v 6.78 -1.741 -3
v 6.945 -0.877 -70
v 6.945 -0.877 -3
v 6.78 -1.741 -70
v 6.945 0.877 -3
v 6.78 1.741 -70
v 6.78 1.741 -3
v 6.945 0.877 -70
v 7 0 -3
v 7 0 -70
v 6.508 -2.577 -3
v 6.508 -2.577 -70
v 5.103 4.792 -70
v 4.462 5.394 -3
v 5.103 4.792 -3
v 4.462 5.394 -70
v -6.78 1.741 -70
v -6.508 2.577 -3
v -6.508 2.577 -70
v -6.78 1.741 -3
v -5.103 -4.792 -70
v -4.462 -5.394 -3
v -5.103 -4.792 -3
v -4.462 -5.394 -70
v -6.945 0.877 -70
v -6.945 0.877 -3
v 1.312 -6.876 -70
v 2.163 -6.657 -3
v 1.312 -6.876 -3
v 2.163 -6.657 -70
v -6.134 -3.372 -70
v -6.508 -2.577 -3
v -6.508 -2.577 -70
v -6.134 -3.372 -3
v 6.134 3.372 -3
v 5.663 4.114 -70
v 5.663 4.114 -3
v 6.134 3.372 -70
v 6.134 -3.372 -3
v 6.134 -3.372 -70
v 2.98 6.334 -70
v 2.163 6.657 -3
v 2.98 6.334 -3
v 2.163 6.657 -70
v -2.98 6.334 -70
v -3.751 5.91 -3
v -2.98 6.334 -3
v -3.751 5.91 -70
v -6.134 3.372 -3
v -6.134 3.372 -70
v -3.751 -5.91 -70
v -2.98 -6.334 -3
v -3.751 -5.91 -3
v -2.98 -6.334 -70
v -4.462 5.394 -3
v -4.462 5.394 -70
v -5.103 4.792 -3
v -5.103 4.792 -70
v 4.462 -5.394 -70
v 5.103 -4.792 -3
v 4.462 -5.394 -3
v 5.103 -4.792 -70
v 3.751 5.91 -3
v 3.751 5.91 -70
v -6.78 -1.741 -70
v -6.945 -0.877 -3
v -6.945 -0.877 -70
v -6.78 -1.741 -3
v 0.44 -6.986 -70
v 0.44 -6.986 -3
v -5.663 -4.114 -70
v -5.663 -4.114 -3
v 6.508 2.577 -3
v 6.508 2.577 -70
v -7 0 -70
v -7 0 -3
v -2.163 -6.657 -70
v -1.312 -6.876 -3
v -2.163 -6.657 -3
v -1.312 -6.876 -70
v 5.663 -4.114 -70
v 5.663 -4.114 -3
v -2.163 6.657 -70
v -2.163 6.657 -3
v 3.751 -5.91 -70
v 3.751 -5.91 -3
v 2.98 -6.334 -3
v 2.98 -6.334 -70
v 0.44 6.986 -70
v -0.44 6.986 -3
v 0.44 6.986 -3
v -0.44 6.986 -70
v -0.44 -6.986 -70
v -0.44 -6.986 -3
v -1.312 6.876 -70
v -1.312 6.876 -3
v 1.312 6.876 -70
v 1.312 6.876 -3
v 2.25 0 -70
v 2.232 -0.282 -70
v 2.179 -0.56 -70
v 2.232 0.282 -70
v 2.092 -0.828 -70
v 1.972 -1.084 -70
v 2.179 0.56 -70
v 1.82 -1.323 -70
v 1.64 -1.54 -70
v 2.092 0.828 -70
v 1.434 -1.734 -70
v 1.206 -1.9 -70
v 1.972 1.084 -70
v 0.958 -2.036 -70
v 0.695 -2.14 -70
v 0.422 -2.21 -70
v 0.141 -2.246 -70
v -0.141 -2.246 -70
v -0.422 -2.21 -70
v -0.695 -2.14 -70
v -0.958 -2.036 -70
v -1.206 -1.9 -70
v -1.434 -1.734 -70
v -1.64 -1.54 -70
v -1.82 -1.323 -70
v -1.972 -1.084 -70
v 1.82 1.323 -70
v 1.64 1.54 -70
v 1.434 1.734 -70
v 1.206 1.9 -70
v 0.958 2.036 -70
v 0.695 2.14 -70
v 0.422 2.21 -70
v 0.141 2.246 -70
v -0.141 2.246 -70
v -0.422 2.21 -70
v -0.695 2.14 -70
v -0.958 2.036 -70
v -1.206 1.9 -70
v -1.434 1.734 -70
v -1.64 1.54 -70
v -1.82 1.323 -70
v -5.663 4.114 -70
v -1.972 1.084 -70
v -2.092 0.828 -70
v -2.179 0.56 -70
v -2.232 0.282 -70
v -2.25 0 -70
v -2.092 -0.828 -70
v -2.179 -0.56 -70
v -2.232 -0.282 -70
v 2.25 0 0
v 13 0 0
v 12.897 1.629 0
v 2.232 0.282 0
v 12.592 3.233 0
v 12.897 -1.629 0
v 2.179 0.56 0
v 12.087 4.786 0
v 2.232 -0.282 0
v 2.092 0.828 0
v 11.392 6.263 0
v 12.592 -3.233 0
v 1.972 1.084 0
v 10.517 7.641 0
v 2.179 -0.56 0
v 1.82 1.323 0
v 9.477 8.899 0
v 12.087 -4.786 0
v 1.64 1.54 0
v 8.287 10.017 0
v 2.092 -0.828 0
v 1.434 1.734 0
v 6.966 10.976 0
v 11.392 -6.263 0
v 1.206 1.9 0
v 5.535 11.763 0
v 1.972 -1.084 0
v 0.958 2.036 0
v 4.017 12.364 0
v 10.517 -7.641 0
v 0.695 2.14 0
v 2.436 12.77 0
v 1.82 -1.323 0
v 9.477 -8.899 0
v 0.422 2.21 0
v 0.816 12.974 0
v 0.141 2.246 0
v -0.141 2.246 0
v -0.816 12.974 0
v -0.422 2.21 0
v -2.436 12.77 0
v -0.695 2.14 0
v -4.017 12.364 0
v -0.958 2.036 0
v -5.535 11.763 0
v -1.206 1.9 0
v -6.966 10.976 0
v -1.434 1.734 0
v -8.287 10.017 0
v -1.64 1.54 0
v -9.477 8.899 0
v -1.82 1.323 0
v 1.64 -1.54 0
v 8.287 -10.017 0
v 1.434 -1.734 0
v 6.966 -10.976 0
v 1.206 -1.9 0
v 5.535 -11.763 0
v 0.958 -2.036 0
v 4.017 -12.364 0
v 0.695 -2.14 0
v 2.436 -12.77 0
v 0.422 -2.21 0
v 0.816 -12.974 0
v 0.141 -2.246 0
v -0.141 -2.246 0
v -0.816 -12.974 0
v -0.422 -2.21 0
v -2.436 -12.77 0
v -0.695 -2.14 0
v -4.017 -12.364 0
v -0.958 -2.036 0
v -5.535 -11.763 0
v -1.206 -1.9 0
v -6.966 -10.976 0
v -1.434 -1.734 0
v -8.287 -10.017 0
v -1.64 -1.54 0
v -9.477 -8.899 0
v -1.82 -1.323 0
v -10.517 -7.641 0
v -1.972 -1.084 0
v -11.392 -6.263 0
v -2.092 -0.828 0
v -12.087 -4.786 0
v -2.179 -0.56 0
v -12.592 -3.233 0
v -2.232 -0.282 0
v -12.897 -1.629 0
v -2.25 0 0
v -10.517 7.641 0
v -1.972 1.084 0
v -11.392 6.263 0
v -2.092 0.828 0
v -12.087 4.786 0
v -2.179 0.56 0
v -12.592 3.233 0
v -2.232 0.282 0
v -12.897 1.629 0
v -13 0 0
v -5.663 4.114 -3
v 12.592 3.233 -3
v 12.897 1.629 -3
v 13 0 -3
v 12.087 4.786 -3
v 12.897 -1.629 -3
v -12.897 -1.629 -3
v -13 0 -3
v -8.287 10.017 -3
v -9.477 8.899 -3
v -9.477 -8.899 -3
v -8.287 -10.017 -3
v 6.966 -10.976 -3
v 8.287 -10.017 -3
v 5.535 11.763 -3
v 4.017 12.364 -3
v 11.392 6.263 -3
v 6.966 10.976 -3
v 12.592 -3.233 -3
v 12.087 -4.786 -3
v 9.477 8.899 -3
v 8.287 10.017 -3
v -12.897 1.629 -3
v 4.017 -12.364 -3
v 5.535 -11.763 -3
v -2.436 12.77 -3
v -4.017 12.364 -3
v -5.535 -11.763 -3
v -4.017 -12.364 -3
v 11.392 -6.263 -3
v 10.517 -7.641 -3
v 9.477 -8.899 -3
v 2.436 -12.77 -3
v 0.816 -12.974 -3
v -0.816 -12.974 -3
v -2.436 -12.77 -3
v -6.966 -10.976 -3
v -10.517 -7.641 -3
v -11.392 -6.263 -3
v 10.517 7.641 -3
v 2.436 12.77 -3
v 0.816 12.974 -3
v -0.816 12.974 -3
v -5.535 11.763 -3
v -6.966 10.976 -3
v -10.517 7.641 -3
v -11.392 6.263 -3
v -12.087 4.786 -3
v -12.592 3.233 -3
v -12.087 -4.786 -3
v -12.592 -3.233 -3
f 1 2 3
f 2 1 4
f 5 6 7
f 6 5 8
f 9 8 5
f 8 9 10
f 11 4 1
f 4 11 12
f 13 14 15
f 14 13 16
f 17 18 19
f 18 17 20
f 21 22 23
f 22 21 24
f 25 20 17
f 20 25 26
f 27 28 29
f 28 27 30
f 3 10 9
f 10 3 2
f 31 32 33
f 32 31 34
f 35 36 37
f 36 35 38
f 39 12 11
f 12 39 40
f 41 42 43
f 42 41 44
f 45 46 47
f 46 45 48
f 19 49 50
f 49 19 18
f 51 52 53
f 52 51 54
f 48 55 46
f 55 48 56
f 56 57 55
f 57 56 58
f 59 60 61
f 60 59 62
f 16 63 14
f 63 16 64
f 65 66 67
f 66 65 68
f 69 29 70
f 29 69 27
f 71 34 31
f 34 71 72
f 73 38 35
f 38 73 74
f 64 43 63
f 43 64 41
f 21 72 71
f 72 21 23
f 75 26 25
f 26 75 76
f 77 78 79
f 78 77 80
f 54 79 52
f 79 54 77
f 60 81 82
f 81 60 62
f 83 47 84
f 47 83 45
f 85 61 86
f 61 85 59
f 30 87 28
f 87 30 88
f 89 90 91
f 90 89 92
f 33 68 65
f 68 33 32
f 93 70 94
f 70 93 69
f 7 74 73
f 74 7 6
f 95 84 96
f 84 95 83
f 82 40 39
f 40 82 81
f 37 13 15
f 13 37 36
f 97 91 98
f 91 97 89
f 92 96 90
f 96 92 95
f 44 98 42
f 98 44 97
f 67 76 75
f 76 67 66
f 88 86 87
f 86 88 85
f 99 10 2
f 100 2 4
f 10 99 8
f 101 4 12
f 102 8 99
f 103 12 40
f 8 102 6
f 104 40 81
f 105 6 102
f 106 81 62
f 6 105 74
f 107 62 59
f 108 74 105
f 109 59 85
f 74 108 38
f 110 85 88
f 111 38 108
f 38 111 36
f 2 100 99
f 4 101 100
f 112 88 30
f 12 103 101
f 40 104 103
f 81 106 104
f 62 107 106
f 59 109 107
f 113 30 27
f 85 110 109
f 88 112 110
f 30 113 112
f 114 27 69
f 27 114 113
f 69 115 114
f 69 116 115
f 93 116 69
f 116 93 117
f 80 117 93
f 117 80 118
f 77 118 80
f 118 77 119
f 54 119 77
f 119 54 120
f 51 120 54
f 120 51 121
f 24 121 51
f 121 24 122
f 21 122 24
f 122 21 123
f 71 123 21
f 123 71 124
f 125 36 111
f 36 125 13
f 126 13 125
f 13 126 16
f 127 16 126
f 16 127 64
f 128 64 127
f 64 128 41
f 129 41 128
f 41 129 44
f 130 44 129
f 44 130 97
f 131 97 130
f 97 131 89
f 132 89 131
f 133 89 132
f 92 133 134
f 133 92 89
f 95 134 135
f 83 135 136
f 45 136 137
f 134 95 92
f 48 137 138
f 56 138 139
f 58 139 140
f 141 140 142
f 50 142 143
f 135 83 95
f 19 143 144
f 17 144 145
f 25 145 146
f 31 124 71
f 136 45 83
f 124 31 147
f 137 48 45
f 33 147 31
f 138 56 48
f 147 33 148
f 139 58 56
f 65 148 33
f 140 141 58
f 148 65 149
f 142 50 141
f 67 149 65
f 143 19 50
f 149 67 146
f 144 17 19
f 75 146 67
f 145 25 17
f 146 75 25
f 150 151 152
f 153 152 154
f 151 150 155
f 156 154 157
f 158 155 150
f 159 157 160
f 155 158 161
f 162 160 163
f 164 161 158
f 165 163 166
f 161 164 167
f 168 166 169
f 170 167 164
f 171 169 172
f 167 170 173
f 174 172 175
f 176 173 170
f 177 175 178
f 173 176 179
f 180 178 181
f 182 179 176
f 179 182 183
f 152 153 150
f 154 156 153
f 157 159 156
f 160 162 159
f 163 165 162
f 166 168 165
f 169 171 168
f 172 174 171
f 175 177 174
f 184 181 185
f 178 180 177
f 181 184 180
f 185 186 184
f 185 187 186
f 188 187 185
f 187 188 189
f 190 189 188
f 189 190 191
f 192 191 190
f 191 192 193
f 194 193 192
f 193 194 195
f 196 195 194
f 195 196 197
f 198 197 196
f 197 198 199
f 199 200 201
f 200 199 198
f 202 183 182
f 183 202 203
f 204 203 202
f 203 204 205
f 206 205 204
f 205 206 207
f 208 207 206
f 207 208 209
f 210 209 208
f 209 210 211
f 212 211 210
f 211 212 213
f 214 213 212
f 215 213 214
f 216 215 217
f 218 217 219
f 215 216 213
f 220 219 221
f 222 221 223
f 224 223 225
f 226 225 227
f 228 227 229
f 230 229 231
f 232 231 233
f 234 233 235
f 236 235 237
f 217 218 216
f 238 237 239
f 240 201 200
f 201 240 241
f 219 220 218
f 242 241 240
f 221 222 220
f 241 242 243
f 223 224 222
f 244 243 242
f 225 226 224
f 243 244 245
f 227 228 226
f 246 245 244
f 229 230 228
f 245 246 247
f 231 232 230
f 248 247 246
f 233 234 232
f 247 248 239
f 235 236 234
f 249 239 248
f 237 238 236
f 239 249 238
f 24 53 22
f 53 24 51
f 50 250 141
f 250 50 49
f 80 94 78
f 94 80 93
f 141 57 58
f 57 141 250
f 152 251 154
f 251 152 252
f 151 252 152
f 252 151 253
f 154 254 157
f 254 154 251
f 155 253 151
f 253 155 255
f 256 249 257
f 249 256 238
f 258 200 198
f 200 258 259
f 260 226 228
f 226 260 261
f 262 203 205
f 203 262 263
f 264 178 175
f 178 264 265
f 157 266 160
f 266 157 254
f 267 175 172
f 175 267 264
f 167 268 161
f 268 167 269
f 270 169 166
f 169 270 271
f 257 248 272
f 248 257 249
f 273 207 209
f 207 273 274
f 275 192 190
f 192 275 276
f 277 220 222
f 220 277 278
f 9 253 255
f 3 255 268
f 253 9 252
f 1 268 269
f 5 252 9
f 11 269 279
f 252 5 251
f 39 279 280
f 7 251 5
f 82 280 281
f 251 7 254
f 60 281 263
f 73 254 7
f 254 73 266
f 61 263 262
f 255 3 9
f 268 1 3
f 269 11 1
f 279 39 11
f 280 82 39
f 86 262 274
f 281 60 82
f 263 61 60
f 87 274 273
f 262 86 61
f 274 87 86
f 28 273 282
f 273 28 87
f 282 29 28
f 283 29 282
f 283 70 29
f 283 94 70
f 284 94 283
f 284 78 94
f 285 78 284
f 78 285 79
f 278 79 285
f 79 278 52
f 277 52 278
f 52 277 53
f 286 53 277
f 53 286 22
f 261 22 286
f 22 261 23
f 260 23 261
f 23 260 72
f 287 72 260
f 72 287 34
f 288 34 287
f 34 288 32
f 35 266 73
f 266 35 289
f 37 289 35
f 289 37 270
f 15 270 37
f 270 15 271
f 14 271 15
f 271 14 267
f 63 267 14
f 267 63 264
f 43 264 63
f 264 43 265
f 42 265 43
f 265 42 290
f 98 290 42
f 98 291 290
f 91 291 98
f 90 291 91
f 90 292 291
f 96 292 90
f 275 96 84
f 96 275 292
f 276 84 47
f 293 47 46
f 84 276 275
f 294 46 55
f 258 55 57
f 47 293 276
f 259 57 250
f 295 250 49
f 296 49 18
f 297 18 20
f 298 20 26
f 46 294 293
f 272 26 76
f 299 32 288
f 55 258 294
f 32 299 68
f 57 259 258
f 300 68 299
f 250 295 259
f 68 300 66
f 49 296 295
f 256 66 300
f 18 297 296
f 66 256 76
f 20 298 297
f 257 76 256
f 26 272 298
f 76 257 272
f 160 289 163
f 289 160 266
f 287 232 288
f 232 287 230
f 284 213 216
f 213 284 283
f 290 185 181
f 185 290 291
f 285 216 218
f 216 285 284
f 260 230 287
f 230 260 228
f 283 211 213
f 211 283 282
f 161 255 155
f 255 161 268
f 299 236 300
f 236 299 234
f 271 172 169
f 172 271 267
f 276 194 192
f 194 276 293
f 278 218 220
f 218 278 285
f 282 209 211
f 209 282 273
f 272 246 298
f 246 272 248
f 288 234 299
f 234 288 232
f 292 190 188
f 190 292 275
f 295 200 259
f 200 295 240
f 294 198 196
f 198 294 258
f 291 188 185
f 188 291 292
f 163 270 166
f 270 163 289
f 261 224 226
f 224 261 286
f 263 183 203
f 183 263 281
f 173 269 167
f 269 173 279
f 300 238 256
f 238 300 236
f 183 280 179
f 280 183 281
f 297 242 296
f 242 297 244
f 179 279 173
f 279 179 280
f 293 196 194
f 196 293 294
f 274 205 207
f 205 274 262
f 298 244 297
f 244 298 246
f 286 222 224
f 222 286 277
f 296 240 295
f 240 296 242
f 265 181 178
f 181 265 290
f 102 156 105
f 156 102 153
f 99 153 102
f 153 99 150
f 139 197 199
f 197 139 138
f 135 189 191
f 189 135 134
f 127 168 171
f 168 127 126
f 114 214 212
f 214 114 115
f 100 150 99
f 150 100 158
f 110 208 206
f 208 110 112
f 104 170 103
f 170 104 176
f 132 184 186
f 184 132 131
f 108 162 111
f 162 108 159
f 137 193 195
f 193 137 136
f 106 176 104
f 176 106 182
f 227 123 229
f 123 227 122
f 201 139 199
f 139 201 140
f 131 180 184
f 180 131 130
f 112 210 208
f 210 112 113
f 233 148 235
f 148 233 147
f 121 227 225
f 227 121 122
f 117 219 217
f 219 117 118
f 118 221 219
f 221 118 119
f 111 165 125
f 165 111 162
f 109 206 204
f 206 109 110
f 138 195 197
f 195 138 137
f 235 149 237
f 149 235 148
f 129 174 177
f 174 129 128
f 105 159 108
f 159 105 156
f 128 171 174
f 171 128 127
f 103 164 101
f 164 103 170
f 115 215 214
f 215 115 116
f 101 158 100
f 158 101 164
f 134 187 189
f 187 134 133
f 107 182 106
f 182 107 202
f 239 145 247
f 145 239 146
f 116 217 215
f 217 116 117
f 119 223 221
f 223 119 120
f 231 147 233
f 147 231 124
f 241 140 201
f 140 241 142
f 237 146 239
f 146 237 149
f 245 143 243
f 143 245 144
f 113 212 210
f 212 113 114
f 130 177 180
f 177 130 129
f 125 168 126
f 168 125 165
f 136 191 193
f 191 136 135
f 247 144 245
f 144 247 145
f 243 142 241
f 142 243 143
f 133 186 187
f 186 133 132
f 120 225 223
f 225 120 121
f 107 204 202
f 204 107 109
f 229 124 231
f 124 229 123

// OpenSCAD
$fn = 50;


difference() {
	union() {
		translate(v = [0, 0, -70.0000000000]) {
			cylinder(h = 70, r = 7.0000000000);
		}
		translate(v = [0, 0, -3.0000000000]) {
			cylinder(h = 3, r = 13.0000000000);
		}
	}
	union() {
		#translate(v = [0, 0, -70]) {
			cylinder(h = 70, r = 2.2500000000);
		}
	}
}
